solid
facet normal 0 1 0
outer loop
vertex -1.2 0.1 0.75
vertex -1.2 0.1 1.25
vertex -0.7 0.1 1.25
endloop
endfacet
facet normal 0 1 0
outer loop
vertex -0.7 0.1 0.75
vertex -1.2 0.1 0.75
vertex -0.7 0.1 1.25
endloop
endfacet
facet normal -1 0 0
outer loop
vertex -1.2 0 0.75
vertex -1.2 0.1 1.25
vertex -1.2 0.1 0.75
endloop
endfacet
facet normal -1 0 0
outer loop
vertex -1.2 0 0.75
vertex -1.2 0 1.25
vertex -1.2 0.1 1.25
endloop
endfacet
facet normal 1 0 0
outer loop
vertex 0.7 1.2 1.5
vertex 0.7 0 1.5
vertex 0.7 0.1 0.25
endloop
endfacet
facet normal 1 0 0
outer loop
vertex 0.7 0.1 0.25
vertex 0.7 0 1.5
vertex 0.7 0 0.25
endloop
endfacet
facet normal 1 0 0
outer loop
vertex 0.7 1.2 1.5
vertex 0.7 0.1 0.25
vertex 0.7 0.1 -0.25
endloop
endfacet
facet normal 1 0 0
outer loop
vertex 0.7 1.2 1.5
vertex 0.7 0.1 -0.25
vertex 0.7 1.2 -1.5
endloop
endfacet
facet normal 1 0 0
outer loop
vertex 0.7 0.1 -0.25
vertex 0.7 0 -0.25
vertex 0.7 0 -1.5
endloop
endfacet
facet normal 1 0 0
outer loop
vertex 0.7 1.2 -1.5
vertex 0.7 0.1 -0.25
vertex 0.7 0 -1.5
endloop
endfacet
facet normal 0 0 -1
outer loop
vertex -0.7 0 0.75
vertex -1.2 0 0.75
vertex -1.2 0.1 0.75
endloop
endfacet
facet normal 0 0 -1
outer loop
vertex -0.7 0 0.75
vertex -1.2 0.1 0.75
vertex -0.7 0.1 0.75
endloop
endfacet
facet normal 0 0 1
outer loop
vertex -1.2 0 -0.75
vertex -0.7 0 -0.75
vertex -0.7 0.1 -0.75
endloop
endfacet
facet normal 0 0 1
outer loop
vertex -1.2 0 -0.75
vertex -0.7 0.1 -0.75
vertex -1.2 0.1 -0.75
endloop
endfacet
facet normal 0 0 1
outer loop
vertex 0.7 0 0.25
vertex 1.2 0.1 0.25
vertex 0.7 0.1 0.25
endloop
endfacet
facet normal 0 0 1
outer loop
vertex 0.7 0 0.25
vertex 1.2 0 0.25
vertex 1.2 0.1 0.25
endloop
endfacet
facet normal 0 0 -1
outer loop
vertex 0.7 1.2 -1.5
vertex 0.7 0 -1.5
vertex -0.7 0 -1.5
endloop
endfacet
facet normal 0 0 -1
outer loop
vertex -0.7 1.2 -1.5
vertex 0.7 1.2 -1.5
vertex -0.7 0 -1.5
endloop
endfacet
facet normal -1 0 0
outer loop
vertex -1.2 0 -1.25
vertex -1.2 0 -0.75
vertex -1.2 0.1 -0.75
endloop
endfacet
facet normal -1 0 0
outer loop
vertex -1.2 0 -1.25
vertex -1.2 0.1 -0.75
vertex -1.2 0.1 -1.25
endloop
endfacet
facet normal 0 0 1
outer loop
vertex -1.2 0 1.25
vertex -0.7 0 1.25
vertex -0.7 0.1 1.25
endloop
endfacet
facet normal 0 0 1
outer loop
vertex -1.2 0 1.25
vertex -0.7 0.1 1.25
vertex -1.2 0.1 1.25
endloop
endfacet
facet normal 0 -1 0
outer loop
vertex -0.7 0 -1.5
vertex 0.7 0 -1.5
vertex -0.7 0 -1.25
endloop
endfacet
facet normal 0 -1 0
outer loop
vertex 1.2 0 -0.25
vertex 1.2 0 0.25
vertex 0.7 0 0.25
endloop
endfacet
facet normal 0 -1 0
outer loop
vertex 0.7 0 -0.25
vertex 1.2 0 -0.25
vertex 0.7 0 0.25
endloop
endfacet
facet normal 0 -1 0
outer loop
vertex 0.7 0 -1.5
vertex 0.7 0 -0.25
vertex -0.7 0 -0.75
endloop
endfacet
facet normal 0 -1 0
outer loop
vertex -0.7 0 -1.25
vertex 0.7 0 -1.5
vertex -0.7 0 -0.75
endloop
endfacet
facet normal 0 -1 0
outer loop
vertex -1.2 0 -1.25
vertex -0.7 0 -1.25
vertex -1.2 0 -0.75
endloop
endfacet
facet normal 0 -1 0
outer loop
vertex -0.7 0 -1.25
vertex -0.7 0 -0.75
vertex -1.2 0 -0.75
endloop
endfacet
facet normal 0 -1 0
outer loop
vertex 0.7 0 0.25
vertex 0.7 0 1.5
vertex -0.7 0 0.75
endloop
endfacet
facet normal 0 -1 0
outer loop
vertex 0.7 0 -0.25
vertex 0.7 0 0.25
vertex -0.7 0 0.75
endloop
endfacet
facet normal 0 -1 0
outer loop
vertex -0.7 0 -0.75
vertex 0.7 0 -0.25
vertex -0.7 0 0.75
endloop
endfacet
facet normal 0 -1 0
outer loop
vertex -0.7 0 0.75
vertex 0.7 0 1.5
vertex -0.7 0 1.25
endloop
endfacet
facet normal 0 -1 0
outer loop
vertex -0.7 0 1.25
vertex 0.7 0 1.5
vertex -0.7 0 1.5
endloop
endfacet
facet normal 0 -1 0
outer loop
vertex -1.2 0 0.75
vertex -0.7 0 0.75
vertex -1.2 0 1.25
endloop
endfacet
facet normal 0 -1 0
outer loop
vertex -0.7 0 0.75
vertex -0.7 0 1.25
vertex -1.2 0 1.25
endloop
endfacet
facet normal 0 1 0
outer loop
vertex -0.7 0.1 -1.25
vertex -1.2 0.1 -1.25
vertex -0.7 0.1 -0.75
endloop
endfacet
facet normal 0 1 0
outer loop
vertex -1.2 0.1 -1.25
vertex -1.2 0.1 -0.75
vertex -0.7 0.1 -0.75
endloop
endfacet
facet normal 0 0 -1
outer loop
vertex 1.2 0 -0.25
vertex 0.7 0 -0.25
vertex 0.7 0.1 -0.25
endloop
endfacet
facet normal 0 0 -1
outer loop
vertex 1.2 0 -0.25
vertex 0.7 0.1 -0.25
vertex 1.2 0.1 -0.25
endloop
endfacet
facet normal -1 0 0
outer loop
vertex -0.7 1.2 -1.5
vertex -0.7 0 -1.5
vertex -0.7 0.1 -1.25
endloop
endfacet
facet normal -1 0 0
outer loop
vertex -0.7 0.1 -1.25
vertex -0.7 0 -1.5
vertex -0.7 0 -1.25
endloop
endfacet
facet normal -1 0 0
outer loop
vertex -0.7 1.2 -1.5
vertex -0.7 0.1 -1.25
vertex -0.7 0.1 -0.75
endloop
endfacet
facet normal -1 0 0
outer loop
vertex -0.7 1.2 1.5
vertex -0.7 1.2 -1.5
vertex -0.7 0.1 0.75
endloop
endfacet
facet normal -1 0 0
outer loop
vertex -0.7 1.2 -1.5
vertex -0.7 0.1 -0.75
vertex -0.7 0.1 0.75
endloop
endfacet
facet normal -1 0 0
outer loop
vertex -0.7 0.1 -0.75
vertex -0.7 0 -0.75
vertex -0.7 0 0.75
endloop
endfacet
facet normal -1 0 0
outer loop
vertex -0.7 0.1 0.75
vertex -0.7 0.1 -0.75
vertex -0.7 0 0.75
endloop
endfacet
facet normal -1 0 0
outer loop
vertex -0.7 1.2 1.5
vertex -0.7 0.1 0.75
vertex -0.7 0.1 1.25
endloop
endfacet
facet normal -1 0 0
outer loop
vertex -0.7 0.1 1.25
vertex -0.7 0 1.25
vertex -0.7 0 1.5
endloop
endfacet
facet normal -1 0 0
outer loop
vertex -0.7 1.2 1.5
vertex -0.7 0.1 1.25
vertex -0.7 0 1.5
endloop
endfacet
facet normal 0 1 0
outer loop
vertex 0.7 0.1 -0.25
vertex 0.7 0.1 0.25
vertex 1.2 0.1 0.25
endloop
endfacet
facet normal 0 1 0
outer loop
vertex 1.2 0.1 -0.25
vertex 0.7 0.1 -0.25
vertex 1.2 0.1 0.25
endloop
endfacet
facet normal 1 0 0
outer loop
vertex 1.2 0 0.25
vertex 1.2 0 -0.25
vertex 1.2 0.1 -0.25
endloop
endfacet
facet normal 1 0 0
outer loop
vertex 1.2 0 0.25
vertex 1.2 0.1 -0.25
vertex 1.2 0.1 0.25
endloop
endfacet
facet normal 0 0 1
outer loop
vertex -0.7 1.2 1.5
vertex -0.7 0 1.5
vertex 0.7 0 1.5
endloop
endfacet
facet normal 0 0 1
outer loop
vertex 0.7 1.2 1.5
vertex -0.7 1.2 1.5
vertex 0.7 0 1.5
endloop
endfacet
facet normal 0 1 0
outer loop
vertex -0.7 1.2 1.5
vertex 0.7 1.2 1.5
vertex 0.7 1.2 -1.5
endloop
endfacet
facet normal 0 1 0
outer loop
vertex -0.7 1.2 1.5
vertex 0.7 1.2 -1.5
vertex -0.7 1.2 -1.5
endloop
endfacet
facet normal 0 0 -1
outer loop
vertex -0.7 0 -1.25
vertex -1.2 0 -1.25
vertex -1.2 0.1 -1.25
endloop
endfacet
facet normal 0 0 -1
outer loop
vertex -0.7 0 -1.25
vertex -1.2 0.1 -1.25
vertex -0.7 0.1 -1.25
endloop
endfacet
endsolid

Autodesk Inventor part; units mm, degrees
ref_plane "YZ Plane" through (0, 0, 0) normal (1, 0, 0) x (0, 1, 0)
ref_plane "XZ Plane" through (0, 0, 0) normal (0, 1, 0) x (-1, 0, 0)
ref_plane "XY Plane" through (0, 0, 0) normal (0, 0, 1) x (1, 0, 0)
sketch "Sketch1" plane through (0, 0, 0) normal (0, 1, 0) x (-1, 0, 0)
  line L0 (0.7, 1.5) -> (-0.7, 1.5)
  line L1 (-0.7, 1.5) -> (-0.7, -1.5)
  line L2 (-0.7, -1.5) -> (0.7, -1.5)
  line L3 (0.7, -1.5) -> (0.7, 1.5)
  line L4 (0.7, 1.5) -> (-0.7, -1.5) construction
  line L5 (-0.7, 1.5) -> (0.7, -1.5) construction
  point P0 (0, 0)
  dimension "d0" = 1.4
  dimension "d1" = 3
extrude "Extrusion1" add sketch "Sketch1" along normal blind 1.2
sketch "Sketch2" plane through (0, 0, 0) normal (0, -1, 0) x (1, 0, 0)
  line L0 (0.7, 1.5) -> (0.7, -1.5) projected
  line L1 (-0.7, 1.25) -> (-1.2, 1.25)
  line L2 (-1.2, 1.25) -> (-1.2, 0.75)
  line L3 (-1.2, 0.75) -> (-0.7, 0.75)
  line L4 (-0.7, 1.25) -> (-1.2, 0.75) construction
  line L5 (-1.2, 1.25) -> (-0.7, 0.75) construction
  line L6 (-0.7, -0.75) -> (-1.2, -0.75)
  line L7 (-1.2, -0.75) -> (-1.2, -1.25)
  line L8 (-1.2, -1.25) -> (-0.7, -1.25)
  line L9 (-0.7, -1.25) -> (-0.7, -0.75)
  line L10 (-0.7, -0.75) -> (-1.2, -1.25) construction
  line L11 (-1.2, -0.75) -> (-0.7, -1.25) construction
  line L12 (1.2, 0.25) -> (0.7, 0.25)
  line L13 (0.7, 0.25) -> (0.7, -0.25)
  line L14 (0.7, -0.25) -> (1.2, -0.25)
  line L15 (1.2, -0.25) -> (1.2, 0.25)
  line L16 (1.2, 0.25) -> (0.7, -0.25) construction
  line L17 (0.7, 0.25) -> (1.2, -0.25) construction
  line L18 (-0.7, 1.25) -> (-0.7, 0.75)
  point P0 (0, 0)
  point P1 (-0.7, 0)
  point P2 (-0.95, 1)
  point P3 (-0.95, -1)
  point P4 (0.95, 0)
  dimension "d5" = 0.5
  dimension "d6" = 0.5
  dimension "d7" = 0.5
  dimension "d8" = 0.5
  dimension "d9" = 0.5
  dimension "d10" = 0.5
extrude "Extrusion2" add sketch "Sketch2" against normal blind 0.1
properties part number "bc848"
